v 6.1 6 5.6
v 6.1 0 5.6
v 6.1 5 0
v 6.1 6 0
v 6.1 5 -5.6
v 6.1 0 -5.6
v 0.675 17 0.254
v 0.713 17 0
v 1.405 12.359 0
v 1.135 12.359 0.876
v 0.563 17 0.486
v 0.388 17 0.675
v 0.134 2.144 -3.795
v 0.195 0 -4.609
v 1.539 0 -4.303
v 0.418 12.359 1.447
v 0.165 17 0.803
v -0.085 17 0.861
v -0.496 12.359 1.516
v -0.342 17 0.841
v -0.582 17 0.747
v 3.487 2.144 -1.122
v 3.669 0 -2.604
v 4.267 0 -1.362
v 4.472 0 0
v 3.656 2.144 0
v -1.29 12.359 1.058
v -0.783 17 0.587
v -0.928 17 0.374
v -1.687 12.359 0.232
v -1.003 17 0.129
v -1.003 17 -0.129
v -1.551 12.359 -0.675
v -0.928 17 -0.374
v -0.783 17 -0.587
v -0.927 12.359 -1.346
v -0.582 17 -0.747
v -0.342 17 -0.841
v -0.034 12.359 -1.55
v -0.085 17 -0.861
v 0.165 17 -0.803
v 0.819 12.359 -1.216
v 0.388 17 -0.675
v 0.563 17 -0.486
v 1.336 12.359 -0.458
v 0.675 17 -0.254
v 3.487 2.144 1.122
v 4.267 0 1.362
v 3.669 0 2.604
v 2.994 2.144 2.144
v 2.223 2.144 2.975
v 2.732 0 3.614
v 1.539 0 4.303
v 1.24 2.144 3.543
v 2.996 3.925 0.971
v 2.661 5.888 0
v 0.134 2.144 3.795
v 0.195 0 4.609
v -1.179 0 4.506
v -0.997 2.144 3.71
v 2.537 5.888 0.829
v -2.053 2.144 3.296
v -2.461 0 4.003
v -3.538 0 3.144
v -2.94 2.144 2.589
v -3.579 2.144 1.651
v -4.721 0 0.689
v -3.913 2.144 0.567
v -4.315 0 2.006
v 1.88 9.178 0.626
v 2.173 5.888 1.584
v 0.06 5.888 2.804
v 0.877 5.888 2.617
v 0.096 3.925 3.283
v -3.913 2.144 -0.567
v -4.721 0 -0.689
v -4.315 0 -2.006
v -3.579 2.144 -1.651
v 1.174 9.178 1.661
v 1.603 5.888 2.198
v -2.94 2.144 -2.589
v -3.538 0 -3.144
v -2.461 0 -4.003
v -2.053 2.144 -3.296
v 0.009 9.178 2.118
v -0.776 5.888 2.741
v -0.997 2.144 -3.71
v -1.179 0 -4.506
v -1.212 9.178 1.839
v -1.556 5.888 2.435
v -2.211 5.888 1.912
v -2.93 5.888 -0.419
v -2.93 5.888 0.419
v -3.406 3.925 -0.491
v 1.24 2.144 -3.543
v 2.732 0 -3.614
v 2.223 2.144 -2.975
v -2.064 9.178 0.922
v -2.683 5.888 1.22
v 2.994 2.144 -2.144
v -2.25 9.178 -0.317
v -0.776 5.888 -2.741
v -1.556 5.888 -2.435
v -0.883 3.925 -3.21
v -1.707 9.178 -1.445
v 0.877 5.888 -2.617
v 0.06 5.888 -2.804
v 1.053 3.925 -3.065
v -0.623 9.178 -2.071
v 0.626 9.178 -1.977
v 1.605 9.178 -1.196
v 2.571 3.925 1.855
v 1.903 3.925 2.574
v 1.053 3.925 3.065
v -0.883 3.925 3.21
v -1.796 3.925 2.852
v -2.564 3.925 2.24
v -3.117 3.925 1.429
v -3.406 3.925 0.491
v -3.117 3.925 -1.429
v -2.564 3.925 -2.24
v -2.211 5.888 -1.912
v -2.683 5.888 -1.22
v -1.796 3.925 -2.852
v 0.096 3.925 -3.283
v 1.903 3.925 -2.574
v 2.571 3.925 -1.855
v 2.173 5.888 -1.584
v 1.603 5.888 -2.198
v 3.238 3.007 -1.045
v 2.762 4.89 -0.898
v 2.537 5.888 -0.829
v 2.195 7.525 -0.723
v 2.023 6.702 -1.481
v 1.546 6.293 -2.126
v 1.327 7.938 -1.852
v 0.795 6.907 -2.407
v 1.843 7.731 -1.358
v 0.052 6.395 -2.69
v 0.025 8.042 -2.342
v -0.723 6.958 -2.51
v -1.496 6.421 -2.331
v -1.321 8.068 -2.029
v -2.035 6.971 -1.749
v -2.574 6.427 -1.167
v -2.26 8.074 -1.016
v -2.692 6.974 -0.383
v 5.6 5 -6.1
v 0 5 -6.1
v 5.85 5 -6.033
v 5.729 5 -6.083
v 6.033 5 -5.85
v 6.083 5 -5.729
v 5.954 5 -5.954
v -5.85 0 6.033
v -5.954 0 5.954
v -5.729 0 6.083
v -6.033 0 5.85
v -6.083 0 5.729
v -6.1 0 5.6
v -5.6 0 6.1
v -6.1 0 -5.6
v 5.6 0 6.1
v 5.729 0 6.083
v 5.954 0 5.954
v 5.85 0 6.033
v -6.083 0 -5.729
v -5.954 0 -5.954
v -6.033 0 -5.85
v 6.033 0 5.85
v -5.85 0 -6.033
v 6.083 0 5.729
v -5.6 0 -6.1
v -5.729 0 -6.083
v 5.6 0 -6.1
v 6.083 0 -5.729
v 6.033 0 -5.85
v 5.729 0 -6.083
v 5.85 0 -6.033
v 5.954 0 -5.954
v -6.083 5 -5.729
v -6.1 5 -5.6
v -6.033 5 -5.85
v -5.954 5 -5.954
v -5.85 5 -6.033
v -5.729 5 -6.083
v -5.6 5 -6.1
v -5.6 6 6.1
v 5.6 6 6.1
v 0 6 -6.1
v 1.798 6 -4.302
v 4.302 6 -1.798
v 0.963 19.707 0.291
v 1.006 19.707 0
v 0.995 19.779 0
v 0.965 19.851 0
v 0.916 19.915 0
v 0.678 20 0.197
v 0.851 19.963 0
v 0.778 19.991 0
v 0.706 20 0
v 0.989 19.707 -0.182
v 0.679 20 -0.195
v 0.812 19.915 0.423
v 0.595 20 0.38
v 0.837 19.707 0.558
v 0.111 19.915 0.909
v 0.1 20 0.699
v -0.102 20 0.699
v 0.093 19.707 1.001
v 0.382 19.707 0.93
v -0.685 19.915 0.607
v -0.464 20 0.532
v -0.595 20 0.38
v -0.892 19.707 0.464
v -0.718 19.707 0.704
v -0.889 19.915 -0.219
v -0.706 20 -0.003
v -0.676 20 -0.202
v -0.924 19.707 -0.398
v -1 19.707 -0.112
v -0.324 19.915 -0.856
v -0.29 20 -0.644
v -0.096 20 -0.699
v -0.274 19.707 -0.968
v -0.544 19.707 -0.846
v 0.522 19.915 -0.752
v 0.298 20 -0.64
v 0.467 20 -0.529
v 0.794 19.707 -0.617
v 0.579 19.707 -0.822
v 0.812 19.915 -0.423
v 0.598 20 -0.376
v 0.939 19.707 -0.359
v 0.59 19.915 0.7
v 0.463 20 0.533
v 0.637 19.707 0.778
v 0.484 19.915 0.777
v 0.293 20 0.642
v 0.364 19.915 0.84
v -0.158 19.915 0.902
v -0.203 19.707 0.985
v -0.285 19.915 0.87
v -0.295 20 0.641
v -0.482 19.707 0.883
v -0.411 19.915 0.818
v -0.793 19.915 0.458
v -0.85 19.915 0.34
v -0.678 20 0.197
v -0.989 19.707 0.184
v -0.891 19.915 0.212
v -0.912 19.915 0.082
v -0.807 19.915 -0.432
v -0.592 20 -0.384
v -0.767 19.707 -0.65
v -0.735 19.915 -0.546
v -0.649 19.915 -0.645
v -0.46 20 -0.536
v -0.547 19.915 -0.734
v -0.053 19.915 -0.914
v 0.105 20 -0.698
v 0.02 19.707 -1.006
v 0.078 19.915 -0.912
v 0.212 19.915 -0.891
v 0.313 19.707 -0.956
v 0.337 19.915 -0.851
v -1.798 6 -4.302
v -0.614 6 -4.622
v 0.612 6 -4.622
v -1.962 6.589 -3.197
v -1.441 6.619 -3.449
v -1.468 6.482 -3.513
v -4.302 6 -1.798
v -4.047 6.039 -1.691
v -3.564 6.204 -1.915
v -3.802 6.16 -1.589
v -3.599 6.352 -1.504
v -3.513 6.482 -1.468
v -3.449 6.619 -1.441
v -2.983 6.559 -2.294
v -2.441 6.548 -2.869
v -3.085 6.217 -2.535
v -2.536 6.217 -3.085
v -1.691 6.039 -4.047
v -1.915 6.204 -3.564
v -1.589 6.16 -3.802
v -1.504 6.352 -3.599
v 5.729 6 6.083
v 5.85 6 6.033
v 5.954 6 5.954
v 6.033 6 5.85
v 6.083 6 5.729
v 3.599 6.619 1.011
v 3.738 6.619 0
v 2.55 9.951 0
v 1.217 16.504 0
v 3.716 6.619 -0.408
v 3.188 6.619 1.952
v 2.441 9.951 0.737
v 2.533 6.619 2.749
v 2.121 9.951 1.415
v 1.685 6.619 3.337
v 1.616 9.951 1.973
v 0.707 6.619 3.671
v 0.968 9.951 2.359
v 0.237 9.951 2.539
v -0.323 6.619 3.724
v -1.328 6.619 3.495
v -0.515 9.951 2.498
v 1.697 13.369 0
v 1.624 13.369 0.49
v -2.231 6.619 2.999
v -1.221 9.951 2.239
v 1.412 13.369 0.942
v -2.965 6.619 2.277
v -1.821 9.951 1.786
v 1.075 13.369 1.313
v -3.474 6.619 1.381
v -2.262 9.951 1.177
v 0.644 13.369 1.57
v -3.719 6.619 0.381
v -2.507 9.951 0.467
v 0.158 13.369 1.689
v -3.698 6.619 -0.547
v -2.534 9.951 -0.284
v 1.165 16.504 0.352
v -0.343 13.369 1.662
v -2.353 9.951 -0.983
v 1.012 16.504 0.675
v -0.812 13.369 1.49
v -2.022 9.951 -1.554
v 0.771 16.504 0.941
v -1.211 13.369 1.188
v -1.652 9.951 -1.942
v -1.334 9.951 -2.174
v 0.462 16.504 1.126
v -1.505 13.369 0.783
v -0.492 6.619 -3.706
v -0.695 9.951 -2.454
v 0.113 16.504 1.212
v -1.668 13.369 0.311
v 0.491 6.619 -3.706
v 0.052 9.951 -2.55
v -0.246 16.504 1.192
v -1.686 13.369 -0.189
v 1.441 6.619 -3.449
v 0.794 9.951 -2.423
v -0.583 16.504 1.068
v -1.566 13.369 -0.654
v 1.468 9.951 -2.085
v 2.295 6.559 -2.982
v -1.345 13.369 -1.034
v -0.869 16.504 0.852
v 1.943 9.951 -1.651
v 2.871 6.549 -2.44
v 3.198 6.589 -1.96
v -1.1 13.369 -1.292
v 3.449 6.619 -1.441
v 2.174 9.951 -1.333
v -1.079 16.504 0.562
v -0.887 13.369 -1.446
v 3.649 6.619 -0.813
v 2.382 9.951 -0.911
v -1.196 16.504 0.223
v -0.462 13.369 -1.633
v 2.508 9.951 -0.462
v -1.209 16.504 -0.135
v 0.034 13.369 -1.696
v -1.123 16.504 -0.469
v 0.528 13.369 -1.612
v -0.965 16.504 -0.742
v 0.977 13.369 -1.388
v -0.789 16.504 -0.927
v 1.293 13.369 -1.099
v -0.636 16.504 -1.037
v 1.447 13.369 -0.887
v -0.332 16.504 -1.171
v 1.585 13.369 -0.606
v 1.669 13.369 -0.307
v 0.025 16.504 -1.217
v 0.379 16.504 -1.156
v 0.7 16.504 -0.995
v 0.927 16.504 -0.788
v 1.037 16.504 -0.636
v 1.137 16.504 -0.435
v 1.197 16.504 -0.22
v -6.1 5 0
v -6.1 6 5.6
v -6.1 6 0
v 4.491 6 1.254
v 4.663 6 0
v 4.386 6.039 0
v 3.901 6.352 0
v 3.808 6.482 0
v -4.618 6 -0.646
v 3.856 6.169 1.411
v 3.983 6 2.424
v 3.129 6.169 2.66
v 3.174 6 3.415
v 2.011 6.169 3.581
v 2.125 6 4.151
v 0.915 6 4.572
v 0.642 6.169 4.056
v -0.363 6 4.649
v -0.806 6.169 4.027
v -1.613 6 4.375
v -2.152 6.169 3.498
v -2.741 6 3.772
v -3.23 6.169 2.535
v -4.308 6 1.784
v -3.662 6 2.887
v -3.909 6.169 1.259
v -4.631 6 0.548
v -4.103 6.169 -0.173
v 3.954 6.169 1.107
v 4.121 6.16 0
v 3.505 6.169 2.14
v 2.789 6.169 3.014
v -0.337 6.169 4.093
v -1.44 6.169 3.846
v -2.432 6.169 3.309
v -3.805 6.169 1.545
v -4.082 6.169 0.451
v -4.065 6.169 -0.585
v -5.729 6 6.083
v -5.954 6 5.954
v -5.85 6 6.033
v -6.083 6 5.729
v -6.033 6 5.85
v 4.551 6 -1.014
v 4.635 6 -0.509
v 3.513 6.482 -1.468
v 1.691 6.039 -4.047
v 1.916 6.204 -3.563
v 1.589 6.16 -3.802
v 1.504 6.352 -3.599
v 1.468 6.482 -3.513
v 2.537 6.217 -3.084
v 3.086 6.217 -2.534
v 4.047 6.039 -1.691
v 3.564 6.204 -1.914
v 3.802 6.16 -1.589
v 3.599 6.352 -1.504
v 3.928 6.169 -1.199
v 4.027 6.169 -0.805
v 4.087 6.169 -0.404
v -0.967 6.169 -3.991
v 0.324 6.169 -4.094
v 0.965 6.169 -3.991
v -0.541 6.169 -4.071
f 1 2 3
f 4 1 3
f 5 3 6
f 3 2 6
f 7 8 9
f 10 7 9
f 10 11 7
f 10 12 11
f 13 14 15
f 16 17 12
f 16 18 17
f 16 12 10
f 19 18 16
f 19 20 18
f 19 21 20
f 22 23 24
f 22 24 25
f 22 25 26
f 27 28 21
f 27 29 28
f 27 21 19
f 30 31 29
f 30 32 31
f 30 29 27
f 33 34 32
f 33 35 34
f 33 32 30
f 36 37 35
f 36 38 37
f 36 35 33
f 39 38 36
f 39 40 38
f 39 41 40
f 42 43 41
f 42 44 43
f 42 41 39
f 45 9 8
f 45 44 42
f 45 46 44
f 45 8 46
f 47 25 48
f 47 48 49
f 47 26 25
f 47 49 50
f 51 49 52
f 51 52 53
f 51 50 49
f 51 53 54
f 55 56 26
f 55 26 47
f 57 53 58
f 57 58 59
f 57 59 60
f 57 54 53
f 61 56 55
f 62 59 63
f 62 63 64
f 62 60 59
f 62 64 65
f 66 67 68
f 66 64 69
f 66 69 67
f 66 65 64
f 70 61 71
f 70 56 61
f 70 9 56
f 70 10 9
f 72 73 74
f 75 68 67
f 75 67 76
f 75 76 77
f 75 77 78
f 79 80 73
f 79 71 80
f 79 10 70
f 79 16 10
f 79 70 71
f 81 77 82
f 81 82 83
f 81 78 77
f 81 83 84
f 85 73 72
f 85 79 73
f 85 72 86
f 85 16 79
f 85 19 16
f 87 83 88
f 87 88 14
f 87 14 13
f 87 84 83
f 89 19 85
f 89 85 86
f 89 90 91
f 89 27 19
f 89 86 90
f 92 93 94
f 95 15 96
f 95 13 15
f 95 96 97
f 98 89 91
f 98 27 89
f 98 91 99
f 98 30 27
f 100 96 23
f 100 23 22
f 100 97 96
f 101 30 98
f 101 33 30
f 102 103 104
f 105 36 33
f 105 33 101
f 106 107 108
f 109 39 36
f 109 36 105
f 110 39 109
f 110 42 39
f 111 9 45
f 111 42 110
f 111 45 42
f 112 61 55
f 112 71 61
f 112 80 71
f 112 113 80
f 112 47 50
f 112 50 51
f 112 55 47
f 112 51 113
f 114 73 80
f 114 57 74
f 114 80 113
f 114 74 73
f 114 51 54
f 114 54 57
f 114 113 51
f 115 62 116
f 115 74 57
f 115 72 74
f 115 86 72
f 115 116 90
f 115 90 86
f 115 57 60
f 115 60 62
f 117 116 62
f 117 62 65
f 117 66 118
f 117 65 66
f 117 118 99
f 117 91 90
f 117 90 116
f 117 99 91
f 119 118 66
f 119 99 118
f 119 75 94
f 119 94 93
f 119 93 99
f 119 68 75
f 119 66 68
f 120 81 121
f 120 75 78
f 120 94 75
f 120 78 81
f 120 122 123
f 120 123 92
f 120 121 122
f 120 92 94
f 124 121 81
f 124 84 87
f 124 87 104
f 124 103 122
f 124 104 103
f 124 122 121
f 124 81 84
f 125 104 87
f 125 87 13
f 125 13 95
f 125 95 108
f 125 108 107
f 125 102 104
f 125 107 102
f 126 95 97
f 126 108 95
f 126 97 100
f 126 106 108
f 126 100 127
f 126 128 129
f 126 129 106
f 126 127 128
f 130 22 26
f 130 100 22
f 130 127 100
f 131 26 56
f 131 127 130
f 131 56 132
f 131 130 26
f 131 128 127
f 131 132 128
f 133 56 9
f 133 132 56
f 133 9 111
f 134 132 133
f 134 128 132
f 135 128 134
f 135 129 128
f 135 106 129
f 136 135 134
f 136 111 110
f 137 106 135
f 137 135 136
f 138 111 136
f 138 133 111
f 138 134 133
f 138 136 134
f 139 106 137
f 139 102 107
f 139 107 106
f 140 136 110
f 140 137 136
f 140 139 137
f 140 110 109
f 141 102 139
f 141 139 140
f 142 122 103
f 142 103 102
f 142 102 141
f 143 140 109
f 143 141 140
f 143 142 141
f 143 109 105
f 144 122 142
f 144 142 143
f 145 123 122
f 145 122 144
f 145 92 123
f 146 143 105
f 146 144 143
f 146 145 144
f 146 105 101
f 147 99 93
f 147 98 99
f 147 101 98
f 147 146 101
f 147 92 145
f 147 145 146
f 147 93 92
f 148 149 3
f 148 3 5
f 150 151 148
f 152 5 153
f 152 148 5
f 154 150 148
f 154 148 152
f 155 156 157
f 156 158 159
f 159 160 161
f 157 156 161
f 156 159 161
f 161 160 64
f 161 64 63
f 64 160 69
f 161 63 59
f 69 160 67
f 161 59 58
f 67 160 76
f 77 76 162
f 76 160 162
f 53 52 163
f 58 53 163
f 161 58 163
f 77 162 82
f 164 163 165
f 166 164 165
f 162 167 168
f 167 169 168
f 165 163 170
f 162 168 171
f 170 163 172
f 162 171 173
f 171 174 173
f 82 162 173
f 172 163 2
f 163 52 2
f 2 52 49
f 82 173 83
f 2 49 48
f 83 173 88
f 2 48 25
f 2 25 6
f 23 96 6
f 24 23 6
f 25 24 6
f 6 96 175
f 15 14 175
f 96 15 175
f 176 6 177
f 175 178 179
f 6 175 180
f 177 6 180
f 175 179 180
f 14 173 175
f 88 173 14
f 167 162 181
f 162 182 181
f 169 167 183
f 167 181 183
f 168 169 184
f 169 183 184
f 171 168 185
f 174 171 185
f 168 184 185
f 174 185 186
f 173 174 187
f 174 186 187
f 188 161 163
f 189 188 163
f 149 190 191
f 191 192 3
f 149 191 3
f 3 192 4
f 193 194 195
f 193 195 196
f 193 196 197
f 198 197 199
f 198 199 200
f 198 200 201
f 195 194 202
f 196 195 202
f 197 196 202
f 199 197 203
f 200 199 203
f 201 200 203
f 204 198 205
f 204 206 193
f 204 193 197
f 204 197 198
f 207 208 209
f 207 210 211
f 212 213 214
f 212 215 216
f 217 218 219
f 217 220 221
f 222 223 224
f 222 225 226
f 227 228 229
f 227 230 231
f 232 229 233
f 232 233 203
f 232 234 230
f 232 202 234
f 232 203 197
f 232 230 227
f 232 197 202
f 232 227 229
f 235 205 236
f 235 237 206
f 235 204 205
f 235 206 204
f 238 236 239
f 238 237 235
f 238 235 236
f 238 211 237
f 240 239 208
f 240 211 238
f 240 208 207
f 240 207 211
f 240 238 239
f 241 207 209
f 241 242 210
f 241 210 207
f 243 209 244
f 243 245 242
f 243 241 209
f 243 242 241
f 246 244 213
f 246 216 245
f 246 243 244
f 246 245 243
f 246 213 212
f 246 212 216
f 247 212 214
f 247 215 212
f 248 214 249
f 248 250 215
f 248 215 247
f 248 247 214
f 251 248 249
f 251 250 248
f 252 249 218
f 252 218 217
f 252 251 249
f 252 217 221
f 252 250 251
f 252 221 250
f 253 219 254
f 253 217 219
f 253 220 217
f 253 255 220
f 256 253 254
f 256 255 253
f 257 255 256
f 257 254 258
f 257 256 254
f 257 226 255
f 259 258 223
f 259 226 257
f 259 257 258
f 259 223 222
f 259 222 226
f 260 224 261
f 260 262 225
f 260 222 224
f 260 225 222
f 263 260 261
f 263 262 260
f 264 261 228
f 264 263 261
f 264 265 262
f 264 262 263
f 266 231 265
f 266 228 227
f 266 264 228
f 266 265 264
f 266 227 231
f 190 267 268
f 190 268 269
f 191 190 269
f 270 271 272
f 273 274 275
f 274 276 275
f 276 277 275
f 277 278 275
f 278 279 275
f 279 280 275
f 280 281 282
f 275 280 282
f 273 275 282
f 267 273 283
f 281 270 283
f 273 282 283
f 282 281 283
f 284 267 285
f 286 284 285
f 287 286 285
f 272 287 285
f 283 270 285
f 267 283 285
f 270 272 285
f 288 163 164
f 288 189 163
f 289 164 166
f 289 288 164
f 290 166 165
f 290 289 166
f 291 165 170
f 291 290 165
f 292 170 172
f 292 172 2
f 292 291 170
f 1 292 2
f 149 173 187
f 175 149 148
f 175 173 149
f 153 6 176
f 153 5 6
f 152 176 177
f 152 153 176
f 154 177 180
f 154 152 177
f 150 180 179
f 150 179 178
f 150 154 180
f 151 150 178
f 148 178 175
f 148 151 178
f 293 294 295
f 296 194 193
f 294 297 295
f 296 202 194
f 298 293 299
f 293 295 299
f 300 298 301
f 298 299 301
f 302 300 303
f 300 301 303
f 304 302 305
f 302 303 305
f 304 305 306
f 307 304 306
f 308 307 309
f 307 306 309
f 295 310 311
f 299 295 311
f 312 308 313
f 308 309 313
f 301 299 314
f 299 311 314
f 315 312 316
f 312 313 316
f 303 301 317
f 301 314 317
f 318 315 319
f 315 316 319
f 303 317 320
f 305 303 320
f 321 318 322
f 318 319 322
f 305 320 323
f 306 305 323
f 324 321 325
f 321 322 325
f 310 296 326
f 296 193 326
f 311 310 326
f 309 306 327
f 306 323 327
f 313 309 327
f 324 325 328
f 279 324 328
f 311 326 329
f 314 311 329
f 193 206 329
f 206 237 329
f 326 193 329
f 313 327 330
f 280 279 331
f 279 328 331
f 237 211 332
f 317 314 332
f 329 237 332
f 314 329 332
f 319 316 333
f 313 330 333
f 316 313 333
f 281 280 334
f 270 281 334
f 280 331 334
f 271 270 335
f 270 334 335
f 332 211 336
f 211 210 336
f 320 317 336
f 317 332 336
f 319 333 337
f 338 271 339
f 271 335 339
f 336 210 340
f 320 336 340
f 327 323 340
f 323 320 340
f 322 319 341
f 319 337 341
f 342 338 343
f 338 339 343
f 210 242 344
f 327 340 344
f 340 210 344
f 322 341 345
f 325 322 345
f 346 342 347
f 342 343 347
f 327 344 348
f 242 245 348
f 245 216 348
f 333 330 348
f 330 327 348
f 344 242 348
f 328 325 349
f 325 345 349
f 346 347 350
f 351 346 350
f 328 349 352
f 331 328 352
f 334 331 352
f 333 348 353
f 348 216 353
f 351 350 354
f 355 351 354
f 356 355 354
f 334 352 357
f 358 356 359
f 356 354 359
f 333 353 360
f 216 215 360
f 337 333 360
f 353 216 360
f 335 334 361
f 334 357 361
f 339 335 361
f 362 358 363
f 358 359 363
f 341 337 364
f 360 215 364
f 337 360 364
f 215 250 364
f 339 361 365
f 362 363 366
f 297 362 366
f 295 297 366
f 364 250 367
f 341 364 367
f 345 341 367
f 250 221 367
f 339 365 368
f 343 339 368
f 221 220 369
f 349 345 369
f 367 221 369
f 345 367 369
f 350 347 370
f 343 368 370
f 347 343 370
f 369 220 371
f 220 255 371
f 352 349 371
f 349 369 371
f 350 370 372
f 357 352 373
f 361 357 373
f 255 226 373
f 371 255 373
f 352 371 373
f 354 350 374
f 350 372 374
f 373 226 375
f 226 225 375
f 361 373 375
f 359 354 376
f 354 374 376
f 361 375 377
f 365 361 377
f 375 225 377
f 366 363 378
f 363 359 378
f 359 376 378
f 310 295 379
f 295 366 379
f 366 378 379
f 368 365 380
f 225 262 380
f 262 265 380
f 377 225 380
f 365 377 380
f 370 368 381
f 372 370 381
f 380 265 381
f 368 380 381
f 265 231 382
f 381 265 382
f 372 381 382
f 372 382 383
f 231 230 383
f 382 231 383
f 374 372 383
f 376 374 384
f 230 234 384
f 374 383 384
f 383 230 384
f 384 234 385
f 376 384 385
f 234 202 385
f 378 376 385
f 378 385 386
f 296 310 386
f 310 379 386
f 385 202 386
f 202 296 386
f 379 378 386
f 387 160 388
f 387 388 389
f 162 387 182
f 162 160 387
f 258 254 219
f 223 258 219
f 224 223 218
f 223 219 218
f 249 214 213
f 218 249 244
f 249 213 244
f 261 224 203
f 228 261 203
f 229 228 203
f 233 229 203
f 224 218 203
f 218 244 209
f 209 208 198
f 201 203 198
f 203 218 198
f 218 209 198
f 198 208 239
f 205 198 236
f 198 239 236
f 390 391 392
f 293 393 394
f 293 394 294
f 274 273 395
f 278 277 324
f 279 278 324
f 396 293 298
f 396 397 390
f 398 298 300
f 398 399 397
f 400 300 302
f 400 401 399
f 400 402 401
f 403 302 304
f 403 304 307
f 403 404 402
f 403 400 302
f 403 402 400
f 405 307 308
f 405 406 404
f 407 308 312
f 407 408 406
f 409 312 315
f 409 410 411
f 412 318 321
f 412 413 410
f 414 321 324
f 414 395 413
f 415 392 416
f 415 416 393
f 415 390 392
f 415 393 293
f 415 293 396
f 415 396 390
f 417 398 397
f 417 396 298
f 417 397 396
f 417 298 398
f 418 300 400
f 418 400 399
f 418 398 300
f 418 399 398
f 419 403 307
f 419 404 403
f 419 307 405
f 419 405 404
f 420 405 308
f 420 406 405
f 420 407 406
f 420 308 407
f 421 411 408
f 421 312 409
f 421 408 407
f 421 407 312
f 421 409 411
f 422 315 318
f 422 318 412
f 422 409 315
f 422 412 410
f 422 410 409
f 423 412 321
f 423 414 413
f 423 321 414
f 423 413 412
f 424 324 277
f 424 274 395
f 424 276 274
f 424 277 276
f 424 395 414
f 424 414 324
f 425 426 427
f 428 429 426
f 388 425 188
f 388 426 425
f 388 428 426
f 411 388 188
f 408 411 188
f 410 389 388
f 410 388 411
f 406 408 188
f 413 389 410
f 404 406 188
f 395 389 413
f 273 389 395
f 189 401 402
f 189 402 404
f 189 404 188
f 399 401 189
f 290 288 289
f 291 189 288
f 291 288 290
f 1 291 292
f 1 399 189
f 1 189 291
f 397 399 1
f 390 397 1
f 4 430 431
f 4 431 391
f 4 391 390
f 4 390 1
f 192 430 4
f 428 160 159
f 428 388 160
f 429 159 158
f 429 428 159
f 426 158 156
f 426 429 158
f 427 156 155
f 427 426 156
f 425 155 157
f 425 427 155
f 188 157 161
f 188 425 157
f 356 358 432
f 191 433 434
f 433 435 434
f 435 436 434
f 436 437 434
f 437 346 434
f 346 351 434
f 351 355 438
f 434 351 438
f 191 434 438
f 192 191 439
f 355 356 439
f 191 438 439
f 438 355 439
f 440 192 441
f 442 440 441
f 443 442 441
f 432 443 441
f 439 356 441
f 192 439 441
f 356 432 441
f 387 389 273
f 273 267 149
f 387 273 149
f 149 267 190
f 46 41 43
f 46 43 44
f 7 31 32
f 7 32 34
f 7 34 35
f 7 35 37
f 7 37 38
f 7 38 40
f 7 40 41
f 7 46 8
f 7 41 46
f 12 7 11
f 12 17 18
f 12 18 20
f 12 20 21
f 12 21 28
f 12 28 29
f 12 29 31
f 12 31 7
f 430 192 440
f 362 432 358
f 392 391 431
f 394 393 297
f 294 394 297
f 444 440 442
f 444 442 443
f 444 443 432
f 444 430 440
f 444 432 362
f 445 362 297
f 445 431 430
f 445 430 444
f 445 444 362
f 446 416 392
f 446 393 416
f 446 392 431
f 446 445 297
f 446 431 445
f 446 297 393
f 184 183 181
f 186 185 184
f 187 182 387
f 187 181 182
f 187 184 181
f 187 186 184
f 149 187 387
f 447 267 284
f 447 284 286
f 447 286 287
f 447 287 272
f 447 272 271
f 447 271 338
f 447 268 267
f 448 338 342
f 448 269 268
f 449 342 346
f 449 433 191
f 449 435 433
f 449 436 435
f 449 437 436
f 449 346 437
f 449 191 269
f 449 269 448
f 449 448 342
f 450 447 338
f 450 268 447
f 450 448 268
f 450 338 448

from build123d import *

# Parameters (mm, degrees)
ESQUISSE1_W             = 12.2
ESQUISSE1_H             = 12.2
BOSS_EXTRU_1_DEPTH      = 6
ENL_V_MAT_EXTRU_1_DEPTH = 1
CONG_2_R                = 0.3
CONG_3_R                = 0.5
CONG_4_R                = 1


with BuildPart() as part:
    # Esquisse1 → Boss.-Extru.1 (new body)
    with BuildSketch(Plane(origin=(0, 0, 0), x_dir=(1, 0, 0), z_dir=(0, 1, 0))):
        Rectangle(ESQUISSE1_W, ESQUISSE1_H)
    extrude(amount=BOSS_EXTRU_1_DEPTH)

    # Esquisse2 → Enlèv. mat.-Extru.1 (cut)
    with BuildSketch(Plane(origin=(0, 6, 0), x_dir=(1, 0, 0), z_dir=(0, 1, 0))):
        Polygon((-6.1, 6.1), (-6.1, 0), (0, 6.1), align=None)
        Polygon((6.1, 6.1), (0, 6.1), (6.1, 0), align=None)
    extrude(amount=-ENL_V_MAT_EXTRU_1_DEPTH, mode=Mode.SUBTRACT)

    # Esquisse4 → Révolution1 (revolve)
    with BuildSketch(Plane.XY):
        with BuildLine():
            Line((0, 20), (0, 6))
            Line((0, 6), (4, 6))
            add(Edge.make_bspline(
                [(4, 6), (1.118476113, 12.647093335), (1, 20)],
                knots=[0, 0, 0, 1, 1, 1], degree=2))
            Line((1, 20), (0, 20))
        make_face()
    revolve(axis=Axis((0, 20, 0), (0, -1, 0)))

    # Congé2
    cong_2_edges = [part.edges().sort_by_distance(p)[0] for p in [
        (-1, 20, 0),
    ]]
    fillet(cong_2_edges, radius=CONG_2_R)

    # Congé3
    cong_3_edges = [part.edges().sort_by_distance(p)[0] for p in [
        (-6.1, 2.5, -6.1),
        (6.1, 2.5, -6.1),
        (6.1, 3, 6.1),
        (-6.1, 3, 6.1),
    ]]
    fillet(cong_3_edges, radius=CONG_3_R)

    # Esquisse5 → Enlèvement de matière-Révolution1 (revolve, cut)
    with BuildSketch(Plane.XY):
        with BuildLine():
            Line((-0.15, 17), (-0.15, 0))
            Line((-0.15, 0), (4.472372581, 0))
            add(Edge.make_bspline(
                [(4.472372581, 0), (2.630008633, 3.831055764), (1.072108734, 14.115127784), (0.713133272, 17)],
                knots=[0, 0, 0, 0, 1, 1, 1, 1], degree=3))
            Line((0.713133272, 17), (-0.15, 17))
        make_face()
    revolve(axis=Axis((-0.15, 17, 0), (0, -1, 0)), mode=Mode.SUBTRACT)

    # Congé4
    cong_4_edges = [part.edges().sort_by_distance(p)[0] for p in [
        (-4, 6, 0),
    ]]
    fillet(cong_4_edges, radius=CONG_4_R)


solid = part.part
